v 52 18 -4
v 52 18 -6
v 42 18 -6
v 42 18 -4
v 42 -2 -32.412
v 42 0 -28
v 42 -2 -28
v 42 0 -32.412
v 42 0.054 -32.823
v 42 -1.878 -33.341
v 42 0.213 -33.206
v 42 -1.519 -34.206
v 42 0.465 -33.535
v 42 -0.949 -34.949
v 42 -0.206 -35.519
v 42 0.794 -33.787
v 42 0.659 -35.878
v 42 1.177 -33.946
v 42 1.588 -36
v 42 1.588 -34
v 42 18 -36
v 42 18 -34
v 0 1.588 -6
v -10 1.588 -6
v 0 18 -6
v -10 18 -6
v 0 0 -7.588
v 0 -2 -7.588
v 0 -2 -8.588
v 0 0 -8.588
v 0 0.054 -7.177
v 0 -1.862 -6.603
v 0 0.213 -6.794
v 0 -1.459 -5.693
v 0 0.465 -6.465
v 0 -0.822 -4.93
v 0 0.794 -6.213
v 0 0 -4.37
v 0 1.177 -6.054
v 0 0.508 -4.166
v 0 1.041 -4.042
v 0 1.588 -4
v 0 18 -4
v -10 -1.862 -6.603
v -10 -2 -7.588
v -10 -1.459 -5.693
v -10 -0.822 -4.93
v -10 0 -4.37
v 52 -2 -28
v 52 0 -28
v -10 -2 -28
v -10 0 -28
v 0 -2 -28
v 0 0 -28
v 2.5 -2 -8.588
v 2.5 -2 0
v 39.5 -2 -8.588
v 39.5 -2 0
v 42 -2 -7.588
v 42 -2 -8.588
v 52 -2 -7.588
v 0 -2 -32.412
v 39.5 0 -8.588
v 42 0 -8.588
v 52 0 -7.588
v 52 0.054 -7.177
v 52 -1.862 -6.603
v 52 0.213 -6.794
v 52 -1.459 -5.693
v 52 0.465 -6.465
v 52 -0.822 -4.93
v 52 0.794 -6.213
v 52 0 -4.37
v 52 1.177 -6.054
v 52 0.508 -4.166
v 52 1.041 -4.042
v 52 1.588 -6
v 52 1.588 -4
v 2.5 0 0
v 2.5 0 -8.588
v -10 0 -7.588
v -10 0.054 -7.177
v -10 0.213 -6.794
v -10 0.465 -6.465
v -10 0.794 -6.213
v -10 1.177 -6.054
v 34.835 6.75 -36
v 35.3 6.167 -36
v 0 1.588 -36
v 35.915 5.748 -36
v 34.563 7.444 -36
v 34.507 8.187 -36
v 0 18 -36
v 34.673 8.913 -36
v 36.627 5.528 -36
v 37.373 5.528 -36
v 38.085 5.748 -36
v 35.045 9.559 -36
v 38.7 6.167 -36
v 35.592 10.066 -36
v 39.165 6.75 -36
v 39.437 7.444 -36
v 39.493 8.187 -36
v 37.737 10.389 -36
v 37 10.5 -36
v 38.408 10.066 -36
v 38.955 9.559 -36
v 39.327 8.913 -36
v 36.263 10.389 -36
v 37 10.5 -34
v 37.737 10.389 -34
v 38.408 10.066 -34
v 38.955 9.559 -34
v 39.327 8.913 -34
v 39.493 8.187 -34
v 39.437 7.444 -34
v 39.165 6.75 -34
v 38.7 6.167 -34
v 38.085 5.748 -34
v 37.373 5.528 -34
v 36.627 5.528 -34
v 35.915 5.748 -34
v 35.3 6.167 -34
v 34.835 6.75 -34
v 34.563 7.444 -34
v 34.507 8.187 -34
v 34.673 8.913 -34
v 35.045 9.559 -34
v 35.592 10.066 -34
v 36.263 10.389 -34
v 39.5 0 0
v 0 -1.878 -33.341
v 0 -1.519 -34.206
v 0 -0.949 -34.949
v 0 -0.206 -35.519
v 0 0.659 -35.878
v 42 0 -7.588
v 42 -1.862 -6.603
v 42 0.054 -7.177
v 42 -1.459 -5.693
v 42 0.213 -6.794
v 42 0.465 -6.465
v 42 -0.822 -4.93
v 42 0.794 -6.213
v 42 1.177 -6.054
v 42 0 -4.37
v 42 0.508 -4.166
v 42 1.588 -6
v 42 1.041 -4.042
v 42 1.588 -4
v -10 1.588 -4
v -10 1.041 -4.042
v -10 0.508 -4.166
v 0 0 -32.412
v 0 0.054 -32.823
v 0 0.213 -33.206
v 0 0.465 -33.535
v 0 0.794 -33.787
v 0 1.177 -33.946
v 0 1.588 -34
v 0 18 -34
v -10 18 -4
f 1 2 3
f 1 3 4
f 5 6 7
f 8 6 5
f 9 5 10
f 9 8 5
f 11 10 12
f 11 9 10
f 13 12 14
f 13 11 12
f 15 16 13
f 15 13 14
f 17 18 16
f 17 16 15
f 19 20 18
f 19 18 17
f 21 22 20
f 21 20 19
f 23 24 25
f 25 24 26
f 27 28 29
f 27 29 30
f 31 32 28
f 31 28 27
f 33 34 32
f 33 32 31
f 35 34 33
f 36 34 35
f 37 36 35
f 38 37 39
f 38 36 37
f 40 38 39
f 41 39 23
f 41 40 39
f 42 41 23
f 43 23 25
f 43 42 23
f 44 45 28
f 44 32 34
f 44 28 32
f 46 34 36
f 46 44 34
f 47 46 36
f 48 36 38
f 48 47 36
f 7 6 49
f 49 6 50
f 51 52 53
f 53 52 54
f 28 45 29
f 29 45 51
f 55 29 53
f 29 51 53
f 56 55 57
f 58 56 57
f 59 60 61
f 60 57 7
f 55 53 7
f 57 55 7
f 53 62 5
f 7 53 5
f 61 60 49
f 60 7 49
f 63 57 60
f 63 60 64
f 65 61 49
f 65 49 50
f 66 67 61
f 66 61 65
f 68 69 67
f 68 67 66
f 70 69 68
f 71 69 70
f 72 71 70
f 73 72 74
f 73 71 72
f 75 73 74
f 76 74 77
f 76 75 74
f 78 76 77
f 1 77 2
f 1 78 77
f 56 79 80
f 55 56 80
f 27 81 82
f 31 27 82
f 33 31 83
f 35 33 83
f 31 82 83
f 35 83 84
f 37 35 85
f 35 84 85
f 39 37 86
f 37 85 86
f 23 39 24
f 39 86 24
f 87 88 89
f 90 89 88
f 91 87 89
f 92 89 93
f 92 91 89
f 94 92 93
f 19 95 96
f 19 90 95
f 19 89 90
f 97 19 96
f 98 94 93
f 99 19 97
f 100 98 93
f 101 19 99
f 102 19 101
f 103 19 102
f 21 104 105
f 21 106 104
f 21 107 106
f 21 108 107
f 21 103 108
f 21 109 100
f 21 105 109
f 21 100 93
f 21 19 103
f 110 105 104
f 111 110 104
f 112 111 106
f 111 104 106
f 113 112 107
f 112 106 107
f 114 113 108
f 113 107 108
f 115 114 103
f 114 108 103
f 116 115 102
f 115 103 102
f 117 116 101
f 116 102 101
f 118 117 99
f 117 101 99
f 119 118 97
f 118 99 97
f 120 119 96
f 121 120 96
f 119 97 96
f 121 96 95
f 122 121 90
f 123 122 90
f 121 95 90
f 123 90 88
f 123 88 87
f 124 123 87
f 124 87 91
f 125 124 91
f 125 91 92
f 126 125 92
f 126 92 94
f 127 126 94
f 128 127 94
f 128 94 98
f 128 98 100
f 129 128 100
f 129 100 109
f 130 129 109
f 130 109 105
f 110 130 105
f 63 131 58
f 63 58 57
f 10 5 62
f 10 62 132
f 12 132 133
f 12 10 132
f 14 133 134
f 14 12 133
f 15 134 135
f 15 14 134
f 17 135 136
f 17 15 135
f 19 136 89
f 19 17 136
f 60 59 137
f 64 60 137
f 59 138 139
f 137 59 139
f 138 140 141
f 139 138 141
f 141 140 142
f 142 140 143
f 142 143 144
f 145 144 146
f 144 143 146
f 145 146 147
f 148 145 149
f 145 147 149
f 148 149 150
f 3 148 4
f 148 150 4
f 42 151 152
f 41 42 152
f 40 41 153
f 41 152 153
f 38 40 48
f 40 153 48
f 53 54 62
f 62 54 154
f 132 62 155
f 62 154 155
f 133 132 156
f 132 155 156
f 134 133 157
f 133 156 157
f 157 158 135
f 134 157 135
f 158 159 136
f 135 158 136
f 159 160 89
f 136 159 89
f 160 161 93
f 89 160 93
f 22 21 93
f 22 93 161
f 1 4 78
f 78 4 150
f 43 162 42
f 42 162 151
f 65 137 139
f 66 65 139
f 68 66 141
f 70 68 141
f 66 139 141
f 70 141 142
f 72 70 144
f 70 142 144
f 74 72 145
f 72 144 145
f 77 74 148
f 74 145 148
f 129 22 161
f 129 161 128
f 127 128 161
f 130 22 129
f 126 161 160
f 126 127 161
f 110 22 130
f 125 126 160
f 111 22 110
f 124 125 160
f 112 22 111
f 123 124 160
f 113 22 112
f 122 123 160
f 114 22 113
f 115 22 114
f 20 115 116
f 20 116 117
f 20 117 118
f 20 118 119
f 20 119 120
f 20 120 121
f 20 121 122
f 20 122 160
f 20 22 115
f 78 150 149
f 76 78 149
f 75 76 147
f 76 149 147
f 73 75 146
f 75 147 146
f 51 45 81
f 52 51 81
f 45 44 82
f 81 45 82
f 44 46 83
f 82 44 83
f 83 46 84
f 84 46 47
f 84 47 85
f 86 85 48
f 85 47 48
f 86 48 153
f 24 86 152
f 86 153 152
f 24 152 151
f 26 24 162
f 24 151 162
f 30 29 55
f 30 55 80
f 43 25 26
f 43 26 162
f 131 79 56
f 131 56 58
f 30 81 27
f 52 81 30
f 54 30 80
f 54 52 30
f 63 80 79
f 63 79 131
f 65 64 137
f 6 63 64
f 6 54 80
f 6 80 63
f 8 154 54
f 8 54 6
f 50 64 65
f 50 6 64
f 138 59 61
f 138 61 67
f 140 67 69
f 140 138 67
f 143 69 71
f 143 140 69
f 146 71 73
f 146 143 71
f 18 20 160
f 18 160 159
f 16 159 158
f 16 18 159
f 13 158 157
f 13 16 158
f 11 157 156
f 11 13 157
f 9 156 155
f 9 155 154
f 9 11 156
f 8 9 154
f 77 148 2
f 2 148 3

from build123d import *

# Parameters (mm, degrees)
SKETCH1_W                    = 42
SKETCH1_H                    = 36
BASE_FLANGE1_DEPTH           = 2
SKETCH6_W                    = 10
SKETCH6_H                    = 24
TAB1_DEPTH                   = 2
SKETCH9_W                    = 10
SKETCH9_H                    = 24
TAB2_DEPTH                   = 2
EDGE_FLANGE1_STRIP_W         = 11.175
EDGE_FLANGE1_STRIP_H         = 2
EDGE_FLANGE1_STRIP_CUT_DEPTH = 42
EDGE_FLANGE1_DEPTH           = 42
EDGE_FLANGE2_START           = -10
EDGE_FLANGE2_DEPTH           = 11
EDGE_FLANGE2_2_DEPTH         = 1
EDGE_FLANGE2_3_DEPTH         = 10
EDGE_FLANGE3_START           = 41
EDGE_FLANGE3_DEPTH           = 11
EDGE_FLANGE3_2_DEPTH         = 1
EDGE_FLANGE3_START_2         = 42
EDGE_FLANGE3_3_DEPTH         = 10
SKETCH21_W                   = 1
SKETCH21_H                   = 4
CUT_EXTRUDE1_DEPTH           = 10
SKETCH22_W                   = 1
SKETCH22_H                   = 4
CUT_EXTRUDE2_DEPTH           = 2
SKETCH23_W                   = 1.5
SKETCH23_H                   = 8.5875
CUT_EXTRUDE3_DEPTH           = 2
SKETCH24_W                   = 1.5
SKETCH24_H                   = 8.5875
CUT_EXTRUDE4_DEPTH           = 2
CUT_EXTRUDE5_REACH           = 67.757
SKETCH26_R                   = 2.5


# Read off the part's stored shape, not the designer's step: Edge-Flange2, Edge-Flange3
# Sheet-metal steps are written as plain solids
with BuildPart() as part:
    # Sketch1 → Base-Flange1 (new body)
    with BuildSketch(Plane(origin=(0, 0, 0), x_dir=(1, 0, 0), z_dir=(0, 1, 0))):
        with Locations((21, 18)):
            Rectangle(SKETCH1_W, SKETCH1_H)
    extrude(amount=-BASE_FLANGE1_DEPTH)

    # Sketch6 → Tab1 (add)
    with BuildSketch(Plane(origin=(0, 0, 0), x_dir=(1, 0, 0), z_dir=(0, 1, 0))):
        with Locations((47, 16)):
            Rectangle(SKETCH6_W, SKETCH6_H)
    extrude(amount=-TAB1_DEPTH)

    # Sketch9 → Tab2 (add)
    with BuildSketch(Plane(origin=(0, 0, 0), x_dir=(1, 0, 0), z_dir=(0, 1, 0))):
        with Locations((-5, 16)):
            Rectangle(SKETCH9_W, SKETCH9_H)
    extrude(amount=-TAB2_DEPTH)

    # Edge-Flange1 strip (across the edge) → Edge-Flange1 strip cut (cut)
    with BuildSketch(Plane(origin=(42, 0, -36), x_dir=(0, 0, 1), z_dir=(-1, 0, 0))):
        with Locations((-2, -1)):
            Rectangle(EDGE_FLANGE1_STRIP_W, EDGE_FLANGE1_STRIP_H)
    extrude(amount=EDGE_FLANGE1_STRIP_CUT_DEPTH, mode=Mode.SUBTRACT)

    # Edge-Flange1 section (across the edge) → Edge-Flange1 (add)
    with BuildSketch(Plane(origin=(42, 0, -36), x_dir=(0, 0, 1), z_dir=(-1, 0, 0))):
        with BuildLine():
            Line((0, 1.5875), (0, 18))
            Line((0, 18), (2, 18))
            Line((2, 18), (2, 1.5875))
            ThreePointArc((2, 1.5875), (2.464967985, 0.464967985), (3.5875, 0))
            Line((3.5875, 0), (3.5875, -2))
            ThreePointArc((3.5875, -2), (1.050754422, -0.949245578), (0, 1.5875))
        make_face()
    extrude(amount=EDGE_FLANGE1_DEPTH)

    # Edge-Flange2 outline → Edge-Flange2 (cut)
    with BuildSketch(Plane.YZ.offset(EDGE_FLANGE2_START)):
        with BuildLine():
            ThreePointArc((-2, -7.5875), (-1.45924519, -5.693430307), (0, -4.370358411))
            Line((0, -4.370358411), (0, -4))
            Line((0, -4), (-2, -4))
            Line((-2, -4), (-2, -7.5875))
        make_face()
    extrude(amount=EDGE_FLANGE2_DEPTH, mode=Mode.SUBTRACT)

    # Edge-Flange2 2 outline → Edge-Flange2 2 (cut)
    with BuildSketch(Plane.YZ):
        with BuildLine():
            Line((0, -8.5875), (0, -4.370358411))
            ThreePointArc((0, -4.370358411), (-1.45924519, -5.693430307), (-2, -7.5875))
            Line((-2, -7.5875), (-2, -8.5875))
            Line((-2, -8.5875), (0, -8.5875))
        make_face()
    extrude(amount=EDGE_FLANGE2_2_DEPTH, mode=Mode.SUBTRACT)

    # Edge-Flange2 3 outline → Edge-Flange2 3 (add)
    with BuildSketch(Plane.YZ.offset(EDGE_FLANGE2_START)):
        with BuildLine():
            Line((18, -4), (1.5875, -4))
            ThreePointArc((1.5875, -4), (0.77243534, -4.093816292), (0, -4.370358411))
            Line((0, -4.370358411), (0, -7.5875))
            ThreePointArc((0, -7.5875), (0.464967985, -6.464967985), (1.5875, -6))
            Line((1.5875, -6), (18, -6))
            Line((18, -6), (18, -4))
        make_face()
    extrude(amount=EDGE_FLANGE2_3_DEPTH)

    # Edge-Flange3 outline → Edge-Flange3 (cut)
    with BuildSketch(Plane.YZ.offset(EDGE_FLANGE3_START)):
        with BuildLine():
            ThreePointArc((-2, -7.5875), (-1.45924519, -5.693430307), (0, -4.370358411))
            Line((0, -4.370358411), (0, -4))
            Line((0, -4), (-2, -4))
            Line((-2, -4), (-2, -7.5875))
        make_face()
    extrude(amount=EDGE_FLANGE3_DEPTH, mode=Mode.SUBTRACT)

    # Edge-Flange3 2 outline → Edge-Flange3 2 (cut)
    with BuildSketch(Plane.YZ.offset(EDGE_FLANGE3_START)):
        with BuildLine():
            Line((0, -8.5875), (0, -4.370358411))
            ThreePointArc((0, -4.370358411), (-1.45924519, -5.693430307), (-2, -7.5875))
            Line((-2, -7.5875), (-2, -8.5875))
            Line((-2, -8.5875), (0, -8.5875))
        make_face()
    extrude(amount=EDGE_FLANGE3_2_DEPTH, mode=Mode.SUBTRACT)

    # Edge-Flange3 3 outline → Edge-Flange3 3 (add)
    with BuildSketch(Plane.YZ.offset(EDGE_FLANGE3_START_2)):
        with BuildLine():
            Line((18, -6), (18, -4))
            Line((18, -4), (1.5875, -4))
            ThreePointArc((1.5875, -4), (0.77243534, -4.093816292), (0, -4.370358411))
            Line((0, -4.370358411), (0, -7.5875))
            ThreePointArc((0, -7.5875), (0.464967985, -6.464967985), (1.5875, -6))
            Line((1.5875, -6), (18, -6))
        make_face()
    extrude(amount=EDGE_FLANGE3_3_DEPTH)

    # Sketch21 → Cut-Extrude1 (cut)
    with BuildSketch(Plane(origin=(0, 0, 0), x_dir=(1, 0, 0), z_dir=(0, 1, 0))):
        with Locations((0.5, 2)):
            Rectangle(SKETCH21_W, SKETCH21_H)
    extrude(amount=-CUT_EXTRUDE1_DEPTH, mode=Mode.SUBTRACT)

    # Sketch22 → Cut-Extrude2 (cut)
    with BuildSketch(Plane(origin=(0, 0, 0), x_dir=(1, 0, 0), z_dir=(0, 1, 0))):
        with Locations((41.5, 2)):
            Rectangle(SKETCH22_W, SKETCH22_H)
    extrude(amount=-CUT_EXTRUDE2_DEPTH, mode=Mode.SUBTRACT)

    # Sketch23 → Cut-Extrude3 (cut)
    with BuildSketch(Plane(origin=(0, 0, 0), x_dir=(1, 0, 0), z_dir=(0, 1, 0))):
        with Locations((1.75, 4.29375)):
            Rectangle(SKETCH23_W, SKETCH23_H)
    extrude(amount=-CUT_EXTRUDE3_DEPTH, mode=Mode.SUBTRACT)

    # Sketch24 → Cut-Extrude4 (cut)
    with BuildSketch(Plane(origin=(0, 0, 0), x_dir=(1, 0, 0), z_dir=(0, 1, 0))):
        with Locations((40.25, 4.29375)):
            Rectangle(SKETCH24_W, SKETCH24_H)
    extrude(amount=-CUT_EXTRUDE4_DEPTH, mode=Mode.SUBTRACT)

    # Sketch26 → Cut-Extrude5 (cut, up to next)
    with BuildSketch(Plane(origin=(0, 0, -36), x_dir=(-1, 0, 0), z_dir=(0, 0, -1)), mode=Mode.PRIVATE) as cut_extrude5_sk1:
        with Locations(Location((-37, 8, 0), (0, 0, 90))):
            Circle(SKETCH26_R)
    cut_extrude5_tool1 = extrude(cut_extrude5_sk1.sketch, amount=-CUT_EXTRUDE5_REACH, mode=Mode.PRIVATE) & part.part
    add(cut_extrude5_tool1.solids().sort_by_distance((37, 8, -36))[0], mode=Mode.SUBTRACT)


solid = part.part
